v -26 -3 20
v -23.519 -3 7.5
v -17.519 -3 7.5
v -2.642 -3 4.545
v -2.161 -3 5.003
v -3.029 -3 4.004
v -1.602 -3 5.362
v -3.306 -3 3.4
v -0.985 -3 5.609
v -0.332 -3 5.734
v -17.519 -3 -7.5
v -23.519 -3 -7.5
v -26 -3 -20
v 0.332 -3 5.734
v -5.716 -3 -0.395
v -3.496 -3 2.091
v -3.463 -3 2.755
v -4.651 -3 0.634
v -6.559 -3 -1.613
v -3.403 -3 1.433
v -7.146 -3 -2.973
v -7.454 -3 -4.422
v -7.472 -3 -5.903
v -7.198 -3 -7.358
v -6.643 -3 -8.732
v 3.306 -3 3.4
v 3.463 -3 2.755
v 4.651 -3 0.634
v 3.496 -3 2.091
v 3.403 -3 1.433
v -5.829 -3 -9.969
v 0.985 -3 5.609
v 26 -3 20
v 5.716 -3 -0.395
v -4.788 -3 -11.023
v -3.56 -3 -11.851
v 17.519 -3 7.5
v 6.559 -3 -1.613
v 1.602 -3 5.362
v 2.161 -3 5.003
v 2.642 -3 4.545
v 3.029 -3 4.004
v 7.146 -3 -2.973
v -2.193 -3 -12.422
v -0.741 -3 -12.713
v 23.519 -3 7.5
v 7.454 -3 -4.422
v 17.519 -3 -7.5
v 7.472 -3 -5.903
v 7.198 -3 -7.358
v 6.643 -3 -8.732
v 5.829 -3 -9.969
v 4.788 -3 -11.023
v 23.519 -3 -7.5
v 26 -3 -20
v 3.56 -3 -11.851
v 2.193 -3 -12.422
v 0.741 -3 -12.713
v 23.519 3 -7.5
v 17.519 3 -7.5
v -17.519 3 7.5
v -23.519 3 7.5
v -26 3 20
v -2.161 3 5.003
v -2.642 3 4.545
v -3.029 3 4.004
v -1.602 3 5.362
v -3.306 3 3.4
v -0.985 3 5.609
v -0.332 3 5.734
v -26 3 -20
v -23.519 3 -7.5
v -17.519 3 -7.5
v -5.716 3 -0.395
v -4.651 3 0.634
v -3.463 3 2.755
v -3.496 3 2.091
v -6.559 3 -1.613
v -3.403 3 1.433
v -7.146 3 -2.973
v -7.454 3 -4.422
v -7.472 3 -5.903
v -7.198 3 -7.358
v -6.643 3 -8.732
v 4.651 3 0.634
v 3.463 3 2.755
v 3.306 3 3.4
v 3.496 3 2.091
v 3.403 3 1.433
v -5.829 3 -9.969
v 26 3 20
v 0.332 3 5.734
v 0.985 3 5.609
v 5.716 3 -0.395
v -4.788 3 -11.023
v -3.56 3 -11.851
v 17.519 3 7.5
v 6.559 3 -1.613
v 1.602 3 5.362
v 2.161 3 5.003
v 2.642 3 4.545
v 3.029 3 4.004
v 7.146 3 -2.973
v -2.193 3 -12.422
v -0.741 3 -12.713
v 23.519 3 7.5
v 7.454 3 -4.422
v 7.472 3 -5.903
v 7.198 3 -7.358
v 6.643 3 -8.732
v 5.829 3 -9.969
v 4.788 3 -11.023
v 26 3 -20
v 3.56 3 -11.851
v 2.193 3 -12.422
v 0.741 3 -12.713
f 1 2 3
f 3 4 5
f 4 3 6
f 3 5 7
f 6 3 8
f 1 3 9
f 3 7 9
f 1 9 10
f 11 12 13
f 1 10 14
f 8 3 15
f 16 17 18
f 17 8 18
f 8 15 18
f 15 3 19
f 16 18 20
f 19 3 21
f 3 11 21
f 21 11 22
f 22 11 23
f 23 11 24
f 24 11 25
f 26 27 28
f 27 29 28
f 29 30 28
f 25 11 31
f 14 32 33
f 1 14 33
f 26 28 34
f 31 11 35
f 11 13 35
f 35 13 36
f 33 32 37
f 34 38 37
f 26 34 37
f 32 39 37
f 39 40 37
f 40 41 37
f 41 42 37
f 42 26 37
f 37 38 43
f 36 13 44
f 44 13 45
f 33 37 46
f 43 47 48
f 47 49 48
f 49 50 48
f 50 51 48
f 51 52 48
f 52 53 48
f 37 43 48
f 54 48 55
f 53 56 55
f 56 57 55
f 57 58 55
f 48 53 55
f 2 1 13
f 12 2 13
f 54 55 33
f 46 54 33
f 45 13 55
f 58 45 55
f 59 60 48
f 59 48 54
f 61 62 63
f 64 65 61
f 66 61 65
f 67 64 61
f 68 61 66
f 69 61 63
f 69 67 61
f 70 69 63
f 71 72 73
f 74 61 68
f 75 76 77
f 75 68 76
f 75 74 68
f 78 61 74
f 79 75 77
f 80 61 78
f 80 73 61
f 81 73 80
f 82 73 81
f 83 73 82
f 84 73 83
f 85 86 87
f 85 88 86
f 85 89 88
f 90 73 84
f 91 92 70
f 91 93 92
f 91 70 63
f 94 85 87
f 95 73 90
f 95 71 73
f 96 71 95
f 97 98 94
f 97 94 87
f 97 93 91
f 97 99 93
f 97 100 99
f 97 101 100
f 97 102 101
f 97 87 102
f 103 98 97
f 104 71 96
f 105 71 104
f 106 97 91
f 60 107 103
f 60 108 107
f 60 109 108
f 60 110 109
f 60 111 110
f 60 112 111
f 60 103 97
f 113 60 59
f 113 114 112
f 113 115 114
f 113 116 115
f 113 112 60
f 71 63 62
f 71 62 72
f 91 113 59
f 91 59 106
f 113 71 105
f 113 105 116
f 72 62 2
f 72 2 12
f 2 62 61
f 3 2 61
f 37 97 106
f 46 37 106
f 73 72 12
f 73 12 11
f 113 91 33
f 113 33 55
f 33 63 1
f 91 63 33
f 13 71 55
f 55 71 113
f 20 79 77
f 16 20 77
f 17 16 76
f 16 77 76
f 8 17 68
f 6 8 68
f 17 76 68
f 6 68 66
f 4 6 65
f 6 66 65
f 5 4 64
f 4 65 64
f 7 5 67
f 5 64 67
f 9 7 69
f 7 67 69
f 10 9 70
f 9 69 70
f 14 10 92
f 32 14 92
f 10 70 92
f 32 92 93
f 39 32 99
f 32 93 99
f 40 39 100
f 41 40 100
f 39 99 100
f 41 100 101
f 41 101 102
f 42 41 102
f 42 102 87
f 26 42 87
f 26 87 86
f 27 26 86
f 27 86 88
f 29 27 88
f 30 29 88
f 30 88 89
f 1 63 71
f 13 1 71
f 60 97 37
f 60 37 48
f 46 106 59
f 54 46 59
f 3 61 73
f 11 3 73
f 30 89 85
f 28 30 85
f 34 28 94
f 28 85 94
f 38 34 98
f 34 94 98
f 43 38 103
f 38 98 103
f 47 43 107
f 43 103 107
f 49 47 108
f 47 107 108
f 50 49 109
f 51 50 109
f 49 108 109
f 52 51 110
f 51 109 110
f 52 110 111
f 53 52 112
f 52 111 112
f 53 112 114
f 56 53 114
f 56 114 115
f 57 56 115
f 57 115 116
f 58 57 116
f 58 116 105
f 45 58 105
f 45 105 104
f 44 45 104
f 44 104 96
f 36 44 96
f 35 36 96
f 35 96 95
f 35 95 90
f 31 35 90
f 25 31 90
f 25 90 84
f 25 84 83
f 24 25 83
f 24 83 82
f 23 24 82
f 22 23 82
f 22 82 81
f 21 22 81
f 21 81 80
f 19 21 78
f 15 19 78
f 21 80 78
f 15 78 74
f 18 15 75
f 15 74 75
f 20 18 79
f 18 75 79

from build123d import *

# Parameters (mm, degrees)
CROQUIS1_W              = 52
CROQUIS1_H              = 40
SALIENTE_EXTRUIR1_DEPTH = 3
CROQUIS2_W              = 6
CROQUIS2_H              = 15
CORTAR_EXTRUIR1_DEPTH   = 34.346664001
CORTAR_EXTRUIR2_DEPTH   = 34.346664001


with BuildPart() as part:
    # Croquis1 → Saliente-Extruir1 (new, symmetric)
    with BuildSketch(Plane(origin=(0, 0, 0), x_dir=(1, 0, 0), z_dir=(0, 1, 0))):
        Rectangle(CROQUIS1_W, CROQUIS1_H)
    extrude(amount=SALIENTE_EXTRUIR1_DEPTH, both=True)

    # Croquis2 → Cortar-Extruir1 (cut, through all)
    with BuildSketch(Plane(origin=(0, 3, 0), x_dir=(1, 0, 0), z_dir=(0, 1, 0))):
        with Locations((-20.51875, 0)):
            Rectangle(CROQUIS2_W, CROQUIS2_H)
        with Locations((20.51875, 0)):
            Rectangle(CROQUIS2_W, CROQUIS2_H)
    extrude(amount=-CORTAR_EXTRUIR1_DEPTH, mode=Mode.SUBTRACT)

    # Croquis3 → Cortar-Extruir2 (cut, through all)
    with BuildSketch(Plane(origin=(0, 3, 0), x_dir=(1, 0, 0), z_dir=(0, 1, 0))):
        with BuildLine():
            ThreePointArc((3.403388834, -1.433333333), (0, 12.75), (-3.403388834, -1.433333333))
            ThreePointArc((-3.403388834, -1.433333333), (0, -5.75), (3.403388834, -1.433333333))
        make_face()
    extrude(amount=-CORTAR_EXTRUIR2_DEPTH, mode=Mode.SUBTRACT)


solid = part.part
